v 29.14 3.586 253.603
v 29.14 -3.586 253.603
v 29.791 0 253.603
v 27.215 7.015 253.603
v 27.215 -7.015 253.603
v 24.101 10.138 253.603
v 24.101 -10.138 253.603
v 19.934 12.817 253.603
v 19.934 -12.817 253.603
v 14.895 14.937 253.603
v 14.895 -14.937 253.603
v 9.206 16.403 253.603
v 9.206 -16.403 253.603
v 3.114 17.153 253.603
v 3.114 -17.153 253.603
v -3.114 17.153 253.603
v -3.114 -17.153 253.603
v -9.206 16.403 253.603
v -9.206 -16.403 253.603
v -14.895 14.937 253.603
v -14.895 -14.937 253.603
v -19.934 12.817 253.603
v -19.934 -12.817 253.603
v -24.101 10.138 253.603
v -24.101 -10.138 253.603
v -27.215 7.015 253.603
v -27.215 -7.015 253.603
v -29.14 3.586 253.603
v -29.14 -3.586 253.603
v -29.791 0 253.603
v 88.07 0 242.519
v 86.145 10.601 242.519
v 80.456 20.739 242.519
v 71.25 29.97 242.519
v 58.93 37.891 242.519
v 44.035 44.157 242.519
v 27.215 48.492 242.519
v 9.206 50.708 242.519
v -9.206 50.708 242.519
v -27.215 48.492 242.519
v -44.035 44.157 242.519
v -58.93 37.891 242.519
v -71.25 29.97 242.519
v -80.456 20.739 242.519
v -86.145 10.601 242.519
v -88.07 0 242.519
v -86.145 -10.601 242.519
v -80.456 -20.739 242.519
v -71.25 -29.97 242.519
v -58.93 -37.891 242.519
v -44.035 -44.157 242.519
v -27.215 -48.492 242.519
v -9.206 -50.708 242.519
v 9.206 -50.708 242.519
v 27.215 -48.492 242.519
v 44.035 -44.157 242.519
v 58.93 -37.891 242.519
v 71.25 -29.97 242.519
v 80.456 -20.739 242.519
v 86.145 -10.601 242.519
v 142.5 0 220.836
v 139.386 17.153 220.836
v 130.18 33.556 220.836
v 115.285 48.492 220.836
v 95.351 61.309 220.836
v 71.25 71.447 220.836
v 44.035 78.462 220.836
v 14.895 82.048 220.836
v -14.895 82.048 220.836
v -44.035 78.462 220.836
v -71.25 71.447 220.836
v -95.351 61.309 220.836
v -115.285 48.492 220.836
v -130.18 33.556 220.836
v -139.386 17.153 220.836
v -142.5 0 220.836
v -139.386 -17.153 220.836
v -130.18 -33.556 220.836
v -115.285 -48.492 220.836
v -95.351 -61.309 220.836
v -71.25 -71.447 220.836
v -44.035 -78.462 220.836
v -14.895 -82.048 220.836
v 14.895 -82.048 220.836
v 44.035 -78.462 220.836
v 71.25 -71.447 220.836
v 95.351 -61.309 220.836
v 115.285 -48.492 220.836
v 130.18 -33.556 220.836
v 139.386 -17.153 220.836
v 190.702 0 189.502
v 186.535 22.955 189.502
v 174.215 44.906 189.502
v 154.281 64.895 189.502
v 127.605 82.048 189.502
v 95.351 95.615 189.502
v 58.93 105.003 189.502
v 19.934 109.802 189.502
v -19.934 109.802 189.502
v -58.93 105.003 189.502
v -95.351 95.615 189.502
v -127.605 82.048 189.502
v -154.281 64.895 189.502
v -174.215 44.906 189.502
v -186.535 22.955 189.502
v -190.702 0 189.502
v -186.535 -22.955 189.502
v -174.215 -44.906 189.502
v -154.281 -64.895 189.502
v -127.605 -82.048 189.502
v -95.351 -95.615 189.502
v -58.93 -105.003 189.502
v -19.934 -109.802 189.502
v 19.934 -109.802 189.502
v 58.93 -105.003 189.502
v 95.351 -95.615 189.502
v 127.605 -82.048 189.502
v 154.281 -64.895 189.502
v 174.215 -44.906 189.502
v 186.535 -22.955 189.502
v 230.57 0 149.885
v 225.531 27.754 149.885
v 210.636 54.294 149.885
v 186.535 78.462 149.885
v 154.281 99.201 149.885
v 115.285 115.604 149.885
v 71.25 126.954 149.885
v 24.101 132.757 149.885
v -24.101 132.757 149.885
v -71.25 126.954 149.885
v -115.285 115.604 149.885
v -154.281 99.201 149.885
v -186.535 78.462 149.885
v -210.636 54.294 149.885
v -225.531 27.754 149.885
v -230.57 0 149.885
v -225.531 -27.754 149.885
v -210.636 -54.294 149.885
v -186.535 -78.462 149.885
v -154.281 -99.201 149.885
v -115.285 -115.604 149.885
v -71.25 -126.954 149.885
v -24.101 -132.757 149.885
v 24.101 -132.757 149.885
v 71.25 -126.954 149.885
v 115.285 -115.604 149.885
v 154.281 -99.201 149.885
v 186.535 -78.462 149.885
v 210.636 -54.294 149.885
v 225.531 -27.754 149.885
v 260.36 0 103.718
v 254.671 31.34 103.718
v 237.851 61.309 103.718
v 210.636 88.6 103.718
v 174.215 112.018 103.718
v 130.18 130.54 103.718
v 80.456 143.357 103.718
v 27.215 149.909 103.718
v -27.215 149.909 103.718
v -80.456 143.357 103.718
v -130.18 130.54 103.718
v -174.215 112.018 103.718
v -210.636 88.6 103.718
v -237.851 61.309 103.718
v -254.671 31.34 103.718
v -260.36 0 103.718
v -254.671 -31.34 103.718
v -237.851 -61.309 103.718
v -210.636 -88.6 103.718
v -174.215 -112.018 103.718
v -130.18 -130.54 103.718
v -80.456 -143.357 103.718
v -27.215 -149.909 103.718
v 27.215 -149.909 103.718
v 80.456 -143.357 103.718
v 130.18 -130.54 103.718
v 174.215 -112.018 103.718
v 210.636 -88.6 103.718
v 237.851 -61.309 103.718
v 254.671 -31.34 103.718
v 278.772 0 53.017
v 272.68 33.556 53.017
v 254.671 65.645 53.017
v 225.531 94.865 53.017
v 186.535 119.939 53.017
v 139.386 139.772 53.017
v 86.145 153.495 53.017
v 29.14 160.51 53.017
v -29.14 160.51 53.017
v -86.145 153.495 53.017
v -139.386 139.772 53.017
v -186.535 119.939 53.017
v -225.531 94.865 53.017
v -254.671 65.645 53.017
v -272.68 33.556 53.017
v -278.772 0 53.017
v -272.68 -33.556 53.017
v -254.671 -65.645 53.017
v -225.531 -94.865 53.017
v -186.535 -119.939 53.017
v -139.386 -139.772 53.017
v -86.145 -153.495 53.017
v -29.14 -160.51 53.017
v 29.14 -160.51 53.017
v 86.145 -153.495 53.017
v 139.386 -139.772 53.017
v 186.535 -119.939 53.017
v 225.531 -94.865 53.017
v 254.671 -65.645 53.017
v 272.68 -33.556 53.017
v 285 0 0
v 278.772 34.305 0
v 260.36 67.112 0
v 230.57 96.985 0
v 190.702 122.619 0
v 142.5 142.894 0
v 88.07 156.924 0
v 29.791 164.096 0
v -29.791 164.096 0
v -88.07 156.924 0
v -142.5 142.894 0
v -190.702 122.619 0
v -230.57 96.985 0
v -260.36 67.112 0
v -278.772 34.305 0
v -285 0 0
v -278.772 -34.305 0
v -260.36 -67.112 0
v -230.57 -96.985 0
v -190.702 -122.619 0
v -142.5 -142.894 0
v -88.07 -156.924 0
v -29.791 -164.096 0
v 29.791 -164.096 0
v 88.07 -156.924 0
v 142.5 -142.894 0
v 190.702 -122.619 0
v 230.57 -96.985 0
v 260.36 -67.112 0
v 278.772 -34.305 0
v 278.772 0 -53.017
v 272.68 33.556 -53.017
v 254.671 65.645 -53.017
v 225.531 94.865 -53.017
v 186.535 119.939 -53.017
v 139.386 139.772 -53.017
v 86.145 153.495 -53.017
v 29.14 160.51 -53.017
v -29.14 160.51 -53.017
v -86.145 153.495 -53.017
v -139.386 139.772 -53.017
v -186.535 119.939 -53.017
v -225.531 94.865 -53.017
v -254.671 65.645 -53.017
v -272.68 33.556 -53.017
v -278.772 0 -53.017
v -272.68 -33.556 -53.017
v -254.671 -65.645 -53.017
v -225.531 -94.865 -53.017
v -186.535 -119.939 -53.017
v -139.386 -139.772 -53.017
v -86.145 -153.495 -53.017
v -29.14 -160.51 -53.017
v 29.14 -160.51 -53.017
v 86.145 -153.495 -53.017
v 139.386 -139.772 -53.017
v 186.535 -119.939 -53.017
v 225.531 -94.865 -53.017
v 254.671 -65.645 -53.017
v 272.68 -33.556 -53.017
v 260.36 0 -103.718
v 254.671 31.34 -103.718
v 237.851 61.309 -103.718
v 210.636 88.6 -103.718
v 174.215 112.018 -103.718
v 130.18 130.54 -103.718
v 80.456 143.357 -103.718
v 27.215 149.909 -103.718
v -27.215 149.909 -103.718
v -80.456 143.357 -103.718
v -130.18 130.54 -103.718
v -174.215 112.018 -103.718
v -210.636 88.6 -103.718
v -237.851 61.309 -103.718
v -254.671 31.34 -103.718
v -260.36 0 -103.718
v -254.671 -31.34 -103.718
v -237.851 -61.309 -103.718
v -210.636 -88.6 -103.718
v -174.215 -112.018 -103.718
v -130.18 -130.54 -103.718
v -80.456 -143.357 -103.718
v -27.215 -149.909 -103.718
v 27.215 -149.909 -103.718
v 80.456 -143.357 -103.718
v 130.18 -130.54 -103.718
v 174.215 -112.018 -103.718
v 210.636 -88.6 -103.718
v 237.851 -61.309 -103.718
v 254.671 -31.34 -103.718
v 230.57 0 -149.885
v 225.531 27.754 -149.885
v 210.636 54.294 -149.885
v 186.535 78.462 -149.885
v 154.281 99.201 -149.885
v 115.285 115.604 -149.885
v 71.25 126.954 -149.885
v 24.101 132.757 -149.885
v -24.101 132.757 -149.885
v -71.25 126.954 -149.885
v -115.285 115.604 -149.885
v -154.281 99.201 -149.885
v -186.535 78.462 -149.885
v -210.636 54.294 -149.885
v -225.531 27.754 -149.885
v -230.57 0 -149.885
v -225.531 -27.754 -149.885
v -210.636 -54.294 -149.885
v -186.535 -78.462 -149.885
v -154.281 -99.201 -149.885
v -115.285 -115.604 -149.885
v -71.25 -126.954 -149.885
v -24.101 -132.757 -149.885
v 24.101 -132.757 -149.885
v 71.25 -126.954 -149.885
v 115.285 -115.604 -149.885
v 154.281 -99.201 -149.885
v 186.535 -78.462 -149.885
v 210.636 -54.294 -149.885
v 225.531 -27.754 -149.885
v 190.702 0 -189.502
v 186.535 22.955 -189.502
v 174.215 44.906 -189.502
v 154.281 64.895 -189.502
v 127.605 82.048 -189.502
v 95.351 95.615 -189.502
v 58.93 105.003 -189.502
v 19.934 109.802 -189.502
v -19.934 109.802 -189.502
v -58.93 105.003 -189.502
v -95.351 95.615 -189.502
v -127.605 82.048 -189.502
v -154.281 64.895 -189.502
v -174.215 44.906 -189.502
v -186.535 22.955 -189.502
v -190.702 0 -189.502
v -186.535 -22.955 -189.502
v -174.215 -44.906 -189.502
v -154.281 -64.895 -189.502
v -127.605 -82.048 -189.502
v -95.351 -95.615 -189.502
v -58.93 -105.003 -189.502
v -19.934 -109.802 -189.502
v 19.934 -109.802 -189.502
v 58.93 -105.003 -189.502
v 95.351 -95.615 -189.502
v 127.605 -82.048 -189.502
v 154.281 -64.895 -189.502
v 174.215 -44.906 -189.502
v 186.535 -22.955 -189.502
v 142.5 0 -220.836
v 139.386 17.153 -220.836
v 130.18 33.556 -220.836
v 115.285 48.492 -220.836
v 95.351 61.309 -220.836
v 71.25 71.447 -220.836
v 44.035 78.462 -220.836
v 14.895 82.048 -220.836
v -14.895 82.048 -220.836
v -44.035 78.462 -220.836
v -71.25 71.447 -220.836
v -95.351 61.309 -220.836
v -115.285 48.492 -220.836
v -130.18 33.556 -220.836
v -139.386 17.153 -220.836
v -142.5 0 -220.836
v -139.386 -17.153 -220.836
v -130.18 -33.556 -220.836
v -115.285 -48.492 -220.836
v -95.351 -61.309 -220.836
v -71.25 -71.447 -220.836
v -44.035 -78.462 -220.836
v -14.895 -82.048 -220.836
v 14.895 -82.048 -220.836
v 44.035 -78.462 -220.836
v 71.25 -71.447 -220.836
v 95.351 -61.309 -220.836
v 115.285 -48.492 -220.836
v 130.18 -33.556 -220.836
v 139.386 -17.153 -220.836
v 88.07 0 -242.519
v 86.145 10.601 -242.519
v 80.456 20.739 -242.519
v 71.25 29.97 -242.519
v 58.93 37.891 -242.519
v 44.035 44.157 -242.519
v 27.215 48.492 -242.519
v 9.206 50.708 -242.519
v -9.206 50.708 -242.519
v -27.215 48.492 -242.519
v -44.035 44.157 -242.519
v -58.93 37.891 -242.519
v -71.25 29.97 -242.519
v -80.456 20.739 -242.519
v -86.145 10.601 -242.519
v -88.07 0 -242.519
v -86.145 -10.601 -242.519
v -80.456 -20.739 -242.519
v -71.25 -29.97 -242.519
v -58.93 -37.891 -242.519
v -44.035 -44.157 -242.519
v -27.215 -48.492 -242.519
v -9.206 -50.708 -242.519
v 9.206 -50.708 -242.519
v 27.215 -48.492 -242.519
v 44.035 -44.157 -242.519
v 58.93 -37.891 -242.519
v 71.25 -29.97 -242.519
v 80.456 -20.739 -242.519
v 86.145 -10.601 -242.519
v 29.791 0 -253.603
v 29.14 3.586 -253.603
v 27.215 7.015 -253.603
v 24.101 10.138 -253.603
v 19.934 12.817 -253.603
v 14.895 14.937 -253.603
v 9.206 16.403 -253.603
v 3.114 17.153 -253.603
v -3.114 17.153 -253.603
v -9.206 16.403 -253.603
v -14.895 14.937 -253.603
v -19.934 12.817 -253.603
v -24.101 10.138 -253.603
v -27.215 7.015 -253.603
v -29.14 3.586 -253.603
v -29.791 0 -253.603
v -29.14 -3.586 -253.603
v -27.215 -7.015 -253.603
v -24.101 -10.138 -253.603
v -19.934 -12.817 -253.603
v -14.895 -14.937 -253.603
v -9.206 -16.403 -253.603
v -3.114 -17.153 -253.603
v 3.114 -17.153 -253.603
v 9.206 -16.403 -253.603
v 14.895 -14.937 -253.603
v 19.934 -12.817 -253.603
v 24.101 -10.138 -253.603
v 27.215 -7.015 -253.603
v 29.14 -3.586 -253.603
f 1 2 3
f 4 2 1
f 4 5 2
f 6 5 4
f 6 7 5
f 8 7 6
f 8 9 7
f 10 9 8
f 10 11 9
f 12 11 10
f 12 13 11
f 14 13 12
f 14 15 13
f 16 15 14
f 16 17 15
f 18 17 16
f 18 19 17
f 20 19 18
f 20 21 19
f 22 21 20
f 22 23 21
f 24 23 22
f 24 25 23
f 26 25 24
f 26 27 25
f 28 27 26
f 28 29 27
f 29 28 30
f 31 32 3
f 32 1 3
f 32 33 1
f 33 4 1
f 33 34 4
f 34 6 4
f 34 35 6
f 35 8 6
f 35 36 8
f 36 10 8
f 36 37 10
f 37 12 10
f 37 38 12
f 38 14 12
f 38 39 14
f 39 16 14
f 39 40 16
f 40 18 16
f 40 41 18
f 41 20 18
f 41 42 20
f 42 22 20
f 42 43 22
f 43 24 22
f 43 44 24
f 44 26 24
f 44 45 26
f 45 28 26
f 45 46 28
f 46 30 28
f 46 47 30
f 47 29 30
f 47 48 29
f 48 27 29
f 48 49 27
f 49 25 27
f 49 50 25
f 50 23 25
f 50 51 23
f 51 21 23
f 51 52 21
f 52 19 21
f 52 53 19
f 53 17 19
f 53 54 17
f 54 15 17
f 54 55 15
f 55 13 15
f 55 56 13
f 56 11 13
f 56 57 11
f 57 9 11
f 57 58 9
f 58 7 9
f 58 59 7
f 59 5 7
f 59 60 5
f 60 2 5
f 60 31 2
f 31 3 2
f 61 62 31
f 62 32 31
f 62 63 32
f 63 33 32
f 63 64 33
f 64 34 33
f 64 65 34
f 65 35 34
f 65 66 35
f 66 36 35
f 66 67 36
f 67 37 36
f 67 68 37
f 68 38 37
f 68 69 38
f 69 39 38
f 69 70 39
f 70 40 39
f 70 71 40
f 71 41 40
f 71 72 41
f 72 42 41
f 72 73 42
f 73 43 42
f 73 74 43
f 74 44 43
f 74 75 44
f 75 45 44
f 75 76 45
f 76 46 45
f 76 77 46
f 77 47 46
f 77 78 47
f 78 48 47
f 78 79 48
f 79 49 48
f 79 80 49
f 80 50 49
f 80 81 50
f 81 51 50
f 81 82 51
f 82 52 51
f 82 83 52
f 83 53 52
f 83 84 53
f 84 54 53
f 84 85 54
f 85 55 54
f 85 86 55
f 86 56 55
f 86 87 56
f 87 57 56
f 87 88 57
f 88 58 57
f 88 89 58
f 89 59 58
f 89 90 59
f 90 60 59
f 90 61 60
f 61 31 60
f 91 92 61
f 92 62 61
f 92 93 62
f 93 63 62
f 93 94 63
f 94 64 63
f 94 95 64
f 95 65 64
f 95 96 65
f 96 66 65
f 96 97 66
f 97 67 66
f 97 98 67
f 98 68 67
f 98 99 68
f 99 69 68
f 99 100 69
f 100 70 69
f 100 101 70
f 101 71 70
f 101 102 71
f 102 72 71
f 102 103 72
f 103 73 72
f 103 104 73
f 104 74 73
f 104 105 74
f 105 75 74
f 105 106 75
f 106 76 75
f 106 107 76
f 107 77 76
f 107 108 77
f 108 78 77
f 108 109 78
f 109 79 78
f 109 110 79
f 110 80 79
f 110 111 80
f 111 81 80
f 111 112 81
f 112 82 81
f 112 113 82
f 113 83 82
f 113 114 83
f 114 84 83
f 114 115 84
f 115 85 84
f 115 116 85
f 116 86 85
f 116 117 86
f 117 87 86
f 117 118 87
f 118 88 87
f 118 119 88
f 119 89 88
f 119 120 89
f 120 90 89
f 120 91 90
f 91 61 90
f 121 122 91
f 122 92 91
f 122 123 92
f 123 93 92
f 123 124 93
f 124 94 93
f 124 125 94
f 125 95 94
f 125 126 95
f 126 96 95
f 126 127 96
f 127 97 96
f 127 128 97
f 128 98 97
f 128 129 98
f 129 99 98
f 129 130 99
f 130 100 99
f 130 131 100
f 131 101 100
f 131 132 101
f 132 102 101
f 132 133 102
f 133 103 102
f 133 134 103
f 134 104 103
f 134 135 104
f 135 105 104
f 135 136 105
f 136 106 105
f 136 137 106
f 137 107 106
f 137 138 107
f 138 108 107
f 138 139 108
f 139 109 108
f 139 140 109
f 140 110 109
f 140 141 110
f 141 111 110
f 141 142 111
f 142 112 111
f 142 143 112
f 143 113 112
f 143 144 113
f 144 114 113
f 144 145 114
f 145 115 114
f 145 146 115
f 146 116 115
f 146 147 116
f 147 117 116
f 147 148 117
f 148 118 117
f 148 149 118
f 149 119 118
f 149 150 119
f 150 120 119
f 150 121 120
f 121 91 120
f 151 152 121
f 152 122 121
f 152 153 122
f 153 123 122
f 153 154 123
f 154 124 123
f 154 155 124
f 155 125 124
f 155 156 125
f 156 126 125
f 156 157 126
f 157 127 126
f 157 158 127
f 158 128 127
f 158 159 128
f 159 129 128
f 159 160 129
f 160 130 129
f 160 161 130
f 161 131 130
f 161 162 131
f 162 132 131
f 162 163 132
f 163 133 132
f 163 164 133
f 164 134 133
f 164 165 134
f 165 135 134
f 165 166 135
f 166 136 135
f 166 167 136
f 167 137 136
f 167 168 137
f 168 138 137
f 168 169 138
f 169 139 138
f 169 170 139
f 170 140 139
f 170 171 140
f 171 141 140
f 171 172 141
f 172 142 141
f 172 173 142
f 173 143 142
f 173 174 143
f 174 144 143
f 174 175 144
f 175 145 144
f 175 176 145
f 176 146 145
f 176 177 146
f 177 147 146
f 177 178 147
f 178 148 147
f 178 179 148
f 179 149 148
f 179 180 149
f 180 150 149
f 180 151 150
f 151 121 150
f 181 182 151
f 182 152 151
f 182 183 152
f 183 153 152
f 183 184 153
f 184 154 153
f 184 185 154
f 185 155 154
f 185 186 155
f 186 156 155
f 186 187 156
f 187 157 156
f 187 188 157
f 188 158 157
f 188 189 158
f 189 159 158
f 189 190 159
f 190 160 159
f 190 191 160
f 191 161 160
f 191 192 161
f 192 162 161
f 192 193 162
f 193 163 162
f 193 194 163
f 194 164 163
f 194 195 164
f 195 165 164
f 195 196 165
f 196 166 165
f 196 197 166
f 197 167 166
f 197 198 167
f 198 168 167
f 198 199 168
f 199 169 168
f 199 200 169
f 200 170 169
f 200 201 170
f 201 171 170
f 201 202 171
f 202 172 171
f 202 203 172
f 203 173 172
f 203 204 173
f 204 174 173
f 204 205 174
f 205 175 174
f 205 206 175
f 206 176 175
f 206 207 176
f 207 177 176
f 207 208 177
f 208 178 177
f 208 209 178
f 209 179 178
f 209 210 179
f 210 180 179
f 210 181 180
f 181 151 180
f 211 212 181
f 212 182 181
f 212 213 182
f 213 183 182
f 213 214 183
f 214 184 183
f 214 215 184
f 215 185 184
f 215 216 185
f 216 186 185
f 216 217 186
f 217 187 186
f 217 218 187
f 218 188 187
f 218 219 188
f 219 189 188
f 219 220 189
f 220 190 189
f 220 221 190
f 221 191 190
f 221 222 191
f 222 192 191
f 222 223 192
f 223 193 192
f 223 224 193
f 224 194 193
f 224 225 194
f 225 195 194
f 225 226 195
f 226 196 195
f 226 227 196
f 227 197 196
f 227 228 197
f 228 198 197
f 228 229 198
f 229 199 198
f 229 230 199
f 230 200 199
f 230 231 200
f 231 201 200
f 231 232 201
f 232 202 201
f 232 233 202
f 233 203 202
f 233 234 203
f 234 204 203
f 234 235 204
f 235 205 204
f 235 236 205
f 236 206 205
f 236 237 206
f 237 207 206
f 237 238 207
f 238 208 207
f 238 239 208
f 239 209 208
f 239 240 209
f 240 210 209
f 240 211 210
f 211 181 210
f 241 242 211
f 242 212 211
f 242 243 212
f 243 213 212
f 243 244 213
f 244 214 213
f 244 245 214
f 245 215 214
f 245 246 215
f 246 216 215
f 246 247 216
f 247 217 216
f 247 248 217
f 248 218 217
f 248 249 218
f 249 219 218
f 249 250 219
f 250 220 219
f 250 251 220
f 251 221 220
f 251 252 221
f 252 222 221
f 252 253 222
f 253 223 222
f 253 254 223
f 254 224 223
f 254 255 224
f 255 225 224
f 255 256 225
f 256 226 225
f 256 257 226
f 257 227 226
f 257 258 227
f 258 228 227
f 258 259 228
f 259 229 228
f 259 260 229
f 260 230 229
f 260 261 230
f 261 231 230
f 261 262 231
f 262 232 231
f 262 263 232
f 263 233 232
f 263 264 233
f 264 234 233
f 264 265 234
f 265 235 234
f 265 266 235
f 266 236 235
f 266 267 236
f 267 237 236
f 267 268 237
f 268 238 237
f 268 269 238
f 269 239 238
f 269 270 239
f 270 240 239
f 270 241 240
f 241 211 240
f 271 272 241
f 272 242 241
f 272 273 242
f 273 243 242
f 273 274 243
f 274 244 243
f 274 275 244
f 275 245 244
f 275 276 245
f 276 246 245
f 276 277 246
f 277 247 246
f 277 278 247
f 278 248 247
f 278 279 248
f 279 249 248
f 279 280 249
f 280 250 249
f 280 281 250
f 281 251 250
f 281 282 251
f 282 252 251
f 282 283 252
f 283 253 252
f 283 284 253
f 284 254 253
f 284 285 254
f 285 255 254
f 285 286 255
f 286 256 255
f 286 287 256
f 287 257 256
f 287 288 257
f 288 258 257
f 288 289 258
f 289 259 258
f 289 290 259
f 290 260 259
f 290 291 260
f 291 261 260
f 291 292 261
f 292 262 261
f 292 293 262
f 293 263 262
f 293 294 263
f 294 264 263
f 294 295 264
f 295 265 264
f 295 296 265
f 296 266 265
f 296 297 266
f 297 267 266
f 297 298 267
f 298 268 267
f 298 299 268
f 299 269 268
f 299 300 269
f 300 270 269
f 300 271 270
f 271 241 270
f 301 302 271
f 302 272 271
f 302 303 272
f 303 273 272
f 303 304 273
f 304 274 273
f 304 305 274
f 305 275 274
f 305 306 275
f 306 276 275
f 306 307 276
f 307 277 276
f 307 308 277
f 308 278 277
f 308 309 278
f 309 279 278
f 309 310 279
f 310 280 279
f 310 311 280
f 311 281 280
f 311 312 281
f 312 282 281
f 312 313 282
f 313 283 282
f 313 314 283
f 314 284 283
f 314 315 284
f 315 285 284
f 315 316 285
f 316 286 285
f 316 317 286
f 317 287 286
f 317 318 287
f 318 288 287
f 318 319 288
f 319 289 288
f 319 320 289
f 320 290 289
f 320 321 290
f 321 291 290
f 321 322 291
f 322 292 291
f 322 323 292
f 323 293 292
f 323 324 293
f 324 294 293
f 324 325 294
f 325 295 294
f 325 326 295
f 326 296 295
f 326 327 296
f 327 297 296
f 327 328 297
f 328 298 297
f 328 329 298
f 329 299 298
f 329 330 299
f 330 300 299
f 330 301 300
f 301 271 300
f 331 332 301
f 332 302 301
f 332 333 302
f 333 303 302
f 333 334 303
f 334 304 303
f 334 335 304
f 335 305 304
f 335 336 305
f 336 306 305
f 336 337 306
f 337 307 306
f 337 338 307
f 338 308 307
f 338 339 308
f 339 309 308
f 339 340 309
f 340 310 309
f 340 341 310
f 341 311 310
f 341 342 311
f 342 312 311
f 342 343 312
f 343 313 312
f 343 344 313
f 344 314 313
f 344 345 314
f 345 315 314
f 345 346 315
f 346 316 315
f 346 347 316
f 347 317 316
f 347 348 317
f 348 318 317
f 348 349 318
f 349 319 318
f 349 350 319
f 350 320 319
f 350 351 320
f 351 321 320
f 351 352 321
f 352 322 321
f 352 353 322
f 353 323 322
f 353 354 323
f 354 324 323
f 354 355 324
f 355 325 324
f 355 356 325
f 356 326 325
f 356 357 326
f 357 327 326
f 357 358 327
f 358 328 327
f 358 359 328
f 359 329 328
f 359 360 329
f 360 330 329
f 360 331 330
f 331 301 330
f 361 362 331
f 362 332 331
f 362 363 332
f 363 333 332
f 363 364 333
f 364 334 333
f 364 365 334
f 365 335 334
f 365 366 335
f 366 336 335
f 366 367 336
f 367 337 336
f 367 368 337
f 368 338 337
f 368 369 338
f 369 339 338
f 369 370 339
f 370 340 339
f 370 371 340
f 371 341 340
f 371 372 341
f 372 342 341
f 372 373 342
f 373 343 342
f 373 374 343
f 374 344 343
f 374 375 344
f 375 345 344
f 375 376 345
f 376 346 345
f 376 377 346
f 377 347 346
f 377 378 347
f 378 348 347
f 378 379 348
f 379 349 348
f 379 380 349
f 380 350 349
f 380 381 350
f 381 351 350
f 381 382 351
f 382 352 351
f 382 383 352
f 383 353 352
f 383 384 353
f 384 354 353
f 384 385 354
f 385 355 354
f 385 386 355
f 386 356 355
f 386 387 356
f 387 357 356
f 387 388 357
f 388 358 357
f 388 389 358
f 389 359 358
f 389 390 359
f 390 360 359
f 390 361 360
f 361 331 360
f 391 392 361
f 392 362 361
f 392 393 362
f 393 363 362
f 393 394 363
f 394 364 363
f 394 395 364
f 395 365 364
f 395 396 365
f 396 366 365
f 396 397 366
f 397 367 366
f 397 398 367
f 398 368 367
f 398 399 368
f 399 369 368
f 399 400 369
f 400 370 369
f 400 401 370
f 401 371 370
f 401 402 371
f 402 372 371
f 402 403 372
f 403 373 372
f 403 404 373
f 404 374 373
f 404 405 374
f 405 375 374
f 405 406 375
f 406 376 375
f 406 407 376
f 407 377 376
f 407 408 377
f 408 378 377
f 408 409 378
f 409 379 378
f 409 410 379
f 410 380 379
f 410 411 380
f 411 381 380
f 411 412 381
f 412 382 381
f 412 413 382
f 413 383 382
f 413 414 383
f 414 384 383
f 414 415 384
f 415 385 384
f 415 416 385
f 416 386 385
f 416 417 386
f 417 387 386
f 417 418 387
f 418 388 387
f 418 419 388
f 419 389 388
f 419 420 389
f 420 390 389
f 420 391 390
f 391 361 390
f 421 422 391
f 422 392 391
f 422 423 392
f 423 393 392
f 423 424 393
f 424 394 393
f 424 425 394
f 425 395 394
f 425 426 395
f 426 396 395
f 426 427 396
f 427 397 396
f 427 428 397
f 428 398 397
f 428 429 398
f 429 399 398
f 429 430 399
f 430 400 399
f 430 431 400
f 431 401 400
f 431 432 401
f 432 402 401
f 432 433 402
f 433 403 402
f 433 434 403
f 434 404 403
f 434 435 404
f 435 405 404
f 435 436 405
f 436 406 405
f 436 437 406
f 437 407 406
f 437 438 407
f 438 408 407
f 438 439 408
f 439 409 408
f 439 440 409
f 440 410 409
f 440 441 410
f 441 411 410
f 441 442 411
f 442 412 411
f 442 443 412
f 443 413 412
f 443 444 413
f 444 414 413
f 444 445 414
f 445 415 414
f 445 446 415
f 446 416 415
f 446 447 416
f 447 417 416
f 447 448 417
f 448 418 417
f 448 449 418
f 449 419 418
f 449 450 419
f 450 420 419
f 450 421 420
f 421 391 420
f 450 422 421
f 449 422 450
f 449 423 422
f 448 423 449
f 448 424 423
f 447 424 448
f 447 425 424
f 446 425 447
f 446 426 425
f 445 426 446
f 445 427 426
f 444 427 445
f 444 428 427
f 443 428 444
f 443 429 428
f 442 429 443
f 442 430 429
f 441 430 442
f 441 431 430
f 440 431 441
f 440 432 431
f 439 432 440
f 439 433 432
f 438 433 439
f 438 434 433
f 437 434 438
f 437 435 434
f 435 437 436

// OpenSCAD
// Generated by SolidPython 1.0.1 on 2020-07-29 00:46:54


scale(v = [19, 11, 17]) {
	sphere(r = 15);
}
/***********************************************
*********      SolidPython code:      **********
************************************************
 
# import packages: SolidPython
from solid import *
from solid.utils import *
from itertools import chain, combinations, permutations


class Resize:

    def __init__(self, scad_file):
        self.scad_file = scad_file
        #self.scad_file = import_scad(scad_file)
        # cone/cylinder param:
        self.r1 = 0
        self.r2 = 0
        self.h = 0
        # rectangular prism param:
        self.w = 0
        self.l = 0
        # ellipse param:
        self.r = 0

    # import OpenScad code (file name corresponds to shape)


    # classify shape + parameters
    def assign(self, param1, param2, param3):
        if self.scad_file == 'cone.scad':
            self.r1 = param1
            self.r2 = param2
            self.h = param3
        elif self.scad_file == 'cylinder.scad':
            self.r1 = param1
            self.r2 = param2
            self.h = param3
        elif self.scad_file == 'rectangularPrism.scad':
            self.h = param1
            self.l = param2
            self.w = param3
        else:
            self.r = param1
            self.h = param2

    # resize parameters
    def iterate(self):
        x = range(3, 20, 2)
        i = 1
        if self.scad_file == 'cone.scad':
            tempList = list(permutations(x, 2))
            for temp in tempList:
                param1 = temp[0]
                param2 = temp[1]
                filepath = 'produced_scad_files/' + 'cone' + str(param1) + '_' + str(param2) + '_' + '.scad'
                scad_render_to_file(cylinder(h=param1, r1=param2, r2=0), filepath)

        elif self.scad_file == 'cylinder.scad':
            tempList = list(permutations(x, 3))
            for temp in tempList:
                param1 = temp[0]
                param2 = temp[1]
                filepath = 'produced_scad_files/' + 'cylinder' + str(param1) + '_' + str(param2) + '_' + '.scad'
                scad_render_to_file(cylinder(h=param1, r1=param2, r2=param2), filepath)

        elif self.scad_file == 'rectangularPrism.scad':
            tempList = list(permutations(x, 3))
            for temp in tempList:
                param1 = temp[0]
                param2 = temp[1]
                param3 = temp[2]
                filepath = 'produced_scad_files/' + 'rectangularPrism' + str(param1) + '_' + str(param2) + '_' + str(
                    param3) + '.scad'
                scad_render_to_file(cube(size=(param1, param2, param3)), filepath)

        elif self.scad_file == 'ellipse.scad':
            tempList = list(permutations(x, 4))
            for temp in tempList:
                param1 = temp[0]
                param2 = temp[1]
                param3 = temp[2]
                param4 = temp[3]
                filepath = 'produced_scad_files/' + 'ellipse' + str(param1) + '_' + str(param2) + '_' + str(param3) + '_' + str(param4) + '.scad'
                scad_render_to_file(scale([param1, param2, param3])(sphere(r=param4)), filepath)

    def render_to_scadfile(self):
        scad_render_to_file(scad, 'example.scad') 
 
************************************************/
